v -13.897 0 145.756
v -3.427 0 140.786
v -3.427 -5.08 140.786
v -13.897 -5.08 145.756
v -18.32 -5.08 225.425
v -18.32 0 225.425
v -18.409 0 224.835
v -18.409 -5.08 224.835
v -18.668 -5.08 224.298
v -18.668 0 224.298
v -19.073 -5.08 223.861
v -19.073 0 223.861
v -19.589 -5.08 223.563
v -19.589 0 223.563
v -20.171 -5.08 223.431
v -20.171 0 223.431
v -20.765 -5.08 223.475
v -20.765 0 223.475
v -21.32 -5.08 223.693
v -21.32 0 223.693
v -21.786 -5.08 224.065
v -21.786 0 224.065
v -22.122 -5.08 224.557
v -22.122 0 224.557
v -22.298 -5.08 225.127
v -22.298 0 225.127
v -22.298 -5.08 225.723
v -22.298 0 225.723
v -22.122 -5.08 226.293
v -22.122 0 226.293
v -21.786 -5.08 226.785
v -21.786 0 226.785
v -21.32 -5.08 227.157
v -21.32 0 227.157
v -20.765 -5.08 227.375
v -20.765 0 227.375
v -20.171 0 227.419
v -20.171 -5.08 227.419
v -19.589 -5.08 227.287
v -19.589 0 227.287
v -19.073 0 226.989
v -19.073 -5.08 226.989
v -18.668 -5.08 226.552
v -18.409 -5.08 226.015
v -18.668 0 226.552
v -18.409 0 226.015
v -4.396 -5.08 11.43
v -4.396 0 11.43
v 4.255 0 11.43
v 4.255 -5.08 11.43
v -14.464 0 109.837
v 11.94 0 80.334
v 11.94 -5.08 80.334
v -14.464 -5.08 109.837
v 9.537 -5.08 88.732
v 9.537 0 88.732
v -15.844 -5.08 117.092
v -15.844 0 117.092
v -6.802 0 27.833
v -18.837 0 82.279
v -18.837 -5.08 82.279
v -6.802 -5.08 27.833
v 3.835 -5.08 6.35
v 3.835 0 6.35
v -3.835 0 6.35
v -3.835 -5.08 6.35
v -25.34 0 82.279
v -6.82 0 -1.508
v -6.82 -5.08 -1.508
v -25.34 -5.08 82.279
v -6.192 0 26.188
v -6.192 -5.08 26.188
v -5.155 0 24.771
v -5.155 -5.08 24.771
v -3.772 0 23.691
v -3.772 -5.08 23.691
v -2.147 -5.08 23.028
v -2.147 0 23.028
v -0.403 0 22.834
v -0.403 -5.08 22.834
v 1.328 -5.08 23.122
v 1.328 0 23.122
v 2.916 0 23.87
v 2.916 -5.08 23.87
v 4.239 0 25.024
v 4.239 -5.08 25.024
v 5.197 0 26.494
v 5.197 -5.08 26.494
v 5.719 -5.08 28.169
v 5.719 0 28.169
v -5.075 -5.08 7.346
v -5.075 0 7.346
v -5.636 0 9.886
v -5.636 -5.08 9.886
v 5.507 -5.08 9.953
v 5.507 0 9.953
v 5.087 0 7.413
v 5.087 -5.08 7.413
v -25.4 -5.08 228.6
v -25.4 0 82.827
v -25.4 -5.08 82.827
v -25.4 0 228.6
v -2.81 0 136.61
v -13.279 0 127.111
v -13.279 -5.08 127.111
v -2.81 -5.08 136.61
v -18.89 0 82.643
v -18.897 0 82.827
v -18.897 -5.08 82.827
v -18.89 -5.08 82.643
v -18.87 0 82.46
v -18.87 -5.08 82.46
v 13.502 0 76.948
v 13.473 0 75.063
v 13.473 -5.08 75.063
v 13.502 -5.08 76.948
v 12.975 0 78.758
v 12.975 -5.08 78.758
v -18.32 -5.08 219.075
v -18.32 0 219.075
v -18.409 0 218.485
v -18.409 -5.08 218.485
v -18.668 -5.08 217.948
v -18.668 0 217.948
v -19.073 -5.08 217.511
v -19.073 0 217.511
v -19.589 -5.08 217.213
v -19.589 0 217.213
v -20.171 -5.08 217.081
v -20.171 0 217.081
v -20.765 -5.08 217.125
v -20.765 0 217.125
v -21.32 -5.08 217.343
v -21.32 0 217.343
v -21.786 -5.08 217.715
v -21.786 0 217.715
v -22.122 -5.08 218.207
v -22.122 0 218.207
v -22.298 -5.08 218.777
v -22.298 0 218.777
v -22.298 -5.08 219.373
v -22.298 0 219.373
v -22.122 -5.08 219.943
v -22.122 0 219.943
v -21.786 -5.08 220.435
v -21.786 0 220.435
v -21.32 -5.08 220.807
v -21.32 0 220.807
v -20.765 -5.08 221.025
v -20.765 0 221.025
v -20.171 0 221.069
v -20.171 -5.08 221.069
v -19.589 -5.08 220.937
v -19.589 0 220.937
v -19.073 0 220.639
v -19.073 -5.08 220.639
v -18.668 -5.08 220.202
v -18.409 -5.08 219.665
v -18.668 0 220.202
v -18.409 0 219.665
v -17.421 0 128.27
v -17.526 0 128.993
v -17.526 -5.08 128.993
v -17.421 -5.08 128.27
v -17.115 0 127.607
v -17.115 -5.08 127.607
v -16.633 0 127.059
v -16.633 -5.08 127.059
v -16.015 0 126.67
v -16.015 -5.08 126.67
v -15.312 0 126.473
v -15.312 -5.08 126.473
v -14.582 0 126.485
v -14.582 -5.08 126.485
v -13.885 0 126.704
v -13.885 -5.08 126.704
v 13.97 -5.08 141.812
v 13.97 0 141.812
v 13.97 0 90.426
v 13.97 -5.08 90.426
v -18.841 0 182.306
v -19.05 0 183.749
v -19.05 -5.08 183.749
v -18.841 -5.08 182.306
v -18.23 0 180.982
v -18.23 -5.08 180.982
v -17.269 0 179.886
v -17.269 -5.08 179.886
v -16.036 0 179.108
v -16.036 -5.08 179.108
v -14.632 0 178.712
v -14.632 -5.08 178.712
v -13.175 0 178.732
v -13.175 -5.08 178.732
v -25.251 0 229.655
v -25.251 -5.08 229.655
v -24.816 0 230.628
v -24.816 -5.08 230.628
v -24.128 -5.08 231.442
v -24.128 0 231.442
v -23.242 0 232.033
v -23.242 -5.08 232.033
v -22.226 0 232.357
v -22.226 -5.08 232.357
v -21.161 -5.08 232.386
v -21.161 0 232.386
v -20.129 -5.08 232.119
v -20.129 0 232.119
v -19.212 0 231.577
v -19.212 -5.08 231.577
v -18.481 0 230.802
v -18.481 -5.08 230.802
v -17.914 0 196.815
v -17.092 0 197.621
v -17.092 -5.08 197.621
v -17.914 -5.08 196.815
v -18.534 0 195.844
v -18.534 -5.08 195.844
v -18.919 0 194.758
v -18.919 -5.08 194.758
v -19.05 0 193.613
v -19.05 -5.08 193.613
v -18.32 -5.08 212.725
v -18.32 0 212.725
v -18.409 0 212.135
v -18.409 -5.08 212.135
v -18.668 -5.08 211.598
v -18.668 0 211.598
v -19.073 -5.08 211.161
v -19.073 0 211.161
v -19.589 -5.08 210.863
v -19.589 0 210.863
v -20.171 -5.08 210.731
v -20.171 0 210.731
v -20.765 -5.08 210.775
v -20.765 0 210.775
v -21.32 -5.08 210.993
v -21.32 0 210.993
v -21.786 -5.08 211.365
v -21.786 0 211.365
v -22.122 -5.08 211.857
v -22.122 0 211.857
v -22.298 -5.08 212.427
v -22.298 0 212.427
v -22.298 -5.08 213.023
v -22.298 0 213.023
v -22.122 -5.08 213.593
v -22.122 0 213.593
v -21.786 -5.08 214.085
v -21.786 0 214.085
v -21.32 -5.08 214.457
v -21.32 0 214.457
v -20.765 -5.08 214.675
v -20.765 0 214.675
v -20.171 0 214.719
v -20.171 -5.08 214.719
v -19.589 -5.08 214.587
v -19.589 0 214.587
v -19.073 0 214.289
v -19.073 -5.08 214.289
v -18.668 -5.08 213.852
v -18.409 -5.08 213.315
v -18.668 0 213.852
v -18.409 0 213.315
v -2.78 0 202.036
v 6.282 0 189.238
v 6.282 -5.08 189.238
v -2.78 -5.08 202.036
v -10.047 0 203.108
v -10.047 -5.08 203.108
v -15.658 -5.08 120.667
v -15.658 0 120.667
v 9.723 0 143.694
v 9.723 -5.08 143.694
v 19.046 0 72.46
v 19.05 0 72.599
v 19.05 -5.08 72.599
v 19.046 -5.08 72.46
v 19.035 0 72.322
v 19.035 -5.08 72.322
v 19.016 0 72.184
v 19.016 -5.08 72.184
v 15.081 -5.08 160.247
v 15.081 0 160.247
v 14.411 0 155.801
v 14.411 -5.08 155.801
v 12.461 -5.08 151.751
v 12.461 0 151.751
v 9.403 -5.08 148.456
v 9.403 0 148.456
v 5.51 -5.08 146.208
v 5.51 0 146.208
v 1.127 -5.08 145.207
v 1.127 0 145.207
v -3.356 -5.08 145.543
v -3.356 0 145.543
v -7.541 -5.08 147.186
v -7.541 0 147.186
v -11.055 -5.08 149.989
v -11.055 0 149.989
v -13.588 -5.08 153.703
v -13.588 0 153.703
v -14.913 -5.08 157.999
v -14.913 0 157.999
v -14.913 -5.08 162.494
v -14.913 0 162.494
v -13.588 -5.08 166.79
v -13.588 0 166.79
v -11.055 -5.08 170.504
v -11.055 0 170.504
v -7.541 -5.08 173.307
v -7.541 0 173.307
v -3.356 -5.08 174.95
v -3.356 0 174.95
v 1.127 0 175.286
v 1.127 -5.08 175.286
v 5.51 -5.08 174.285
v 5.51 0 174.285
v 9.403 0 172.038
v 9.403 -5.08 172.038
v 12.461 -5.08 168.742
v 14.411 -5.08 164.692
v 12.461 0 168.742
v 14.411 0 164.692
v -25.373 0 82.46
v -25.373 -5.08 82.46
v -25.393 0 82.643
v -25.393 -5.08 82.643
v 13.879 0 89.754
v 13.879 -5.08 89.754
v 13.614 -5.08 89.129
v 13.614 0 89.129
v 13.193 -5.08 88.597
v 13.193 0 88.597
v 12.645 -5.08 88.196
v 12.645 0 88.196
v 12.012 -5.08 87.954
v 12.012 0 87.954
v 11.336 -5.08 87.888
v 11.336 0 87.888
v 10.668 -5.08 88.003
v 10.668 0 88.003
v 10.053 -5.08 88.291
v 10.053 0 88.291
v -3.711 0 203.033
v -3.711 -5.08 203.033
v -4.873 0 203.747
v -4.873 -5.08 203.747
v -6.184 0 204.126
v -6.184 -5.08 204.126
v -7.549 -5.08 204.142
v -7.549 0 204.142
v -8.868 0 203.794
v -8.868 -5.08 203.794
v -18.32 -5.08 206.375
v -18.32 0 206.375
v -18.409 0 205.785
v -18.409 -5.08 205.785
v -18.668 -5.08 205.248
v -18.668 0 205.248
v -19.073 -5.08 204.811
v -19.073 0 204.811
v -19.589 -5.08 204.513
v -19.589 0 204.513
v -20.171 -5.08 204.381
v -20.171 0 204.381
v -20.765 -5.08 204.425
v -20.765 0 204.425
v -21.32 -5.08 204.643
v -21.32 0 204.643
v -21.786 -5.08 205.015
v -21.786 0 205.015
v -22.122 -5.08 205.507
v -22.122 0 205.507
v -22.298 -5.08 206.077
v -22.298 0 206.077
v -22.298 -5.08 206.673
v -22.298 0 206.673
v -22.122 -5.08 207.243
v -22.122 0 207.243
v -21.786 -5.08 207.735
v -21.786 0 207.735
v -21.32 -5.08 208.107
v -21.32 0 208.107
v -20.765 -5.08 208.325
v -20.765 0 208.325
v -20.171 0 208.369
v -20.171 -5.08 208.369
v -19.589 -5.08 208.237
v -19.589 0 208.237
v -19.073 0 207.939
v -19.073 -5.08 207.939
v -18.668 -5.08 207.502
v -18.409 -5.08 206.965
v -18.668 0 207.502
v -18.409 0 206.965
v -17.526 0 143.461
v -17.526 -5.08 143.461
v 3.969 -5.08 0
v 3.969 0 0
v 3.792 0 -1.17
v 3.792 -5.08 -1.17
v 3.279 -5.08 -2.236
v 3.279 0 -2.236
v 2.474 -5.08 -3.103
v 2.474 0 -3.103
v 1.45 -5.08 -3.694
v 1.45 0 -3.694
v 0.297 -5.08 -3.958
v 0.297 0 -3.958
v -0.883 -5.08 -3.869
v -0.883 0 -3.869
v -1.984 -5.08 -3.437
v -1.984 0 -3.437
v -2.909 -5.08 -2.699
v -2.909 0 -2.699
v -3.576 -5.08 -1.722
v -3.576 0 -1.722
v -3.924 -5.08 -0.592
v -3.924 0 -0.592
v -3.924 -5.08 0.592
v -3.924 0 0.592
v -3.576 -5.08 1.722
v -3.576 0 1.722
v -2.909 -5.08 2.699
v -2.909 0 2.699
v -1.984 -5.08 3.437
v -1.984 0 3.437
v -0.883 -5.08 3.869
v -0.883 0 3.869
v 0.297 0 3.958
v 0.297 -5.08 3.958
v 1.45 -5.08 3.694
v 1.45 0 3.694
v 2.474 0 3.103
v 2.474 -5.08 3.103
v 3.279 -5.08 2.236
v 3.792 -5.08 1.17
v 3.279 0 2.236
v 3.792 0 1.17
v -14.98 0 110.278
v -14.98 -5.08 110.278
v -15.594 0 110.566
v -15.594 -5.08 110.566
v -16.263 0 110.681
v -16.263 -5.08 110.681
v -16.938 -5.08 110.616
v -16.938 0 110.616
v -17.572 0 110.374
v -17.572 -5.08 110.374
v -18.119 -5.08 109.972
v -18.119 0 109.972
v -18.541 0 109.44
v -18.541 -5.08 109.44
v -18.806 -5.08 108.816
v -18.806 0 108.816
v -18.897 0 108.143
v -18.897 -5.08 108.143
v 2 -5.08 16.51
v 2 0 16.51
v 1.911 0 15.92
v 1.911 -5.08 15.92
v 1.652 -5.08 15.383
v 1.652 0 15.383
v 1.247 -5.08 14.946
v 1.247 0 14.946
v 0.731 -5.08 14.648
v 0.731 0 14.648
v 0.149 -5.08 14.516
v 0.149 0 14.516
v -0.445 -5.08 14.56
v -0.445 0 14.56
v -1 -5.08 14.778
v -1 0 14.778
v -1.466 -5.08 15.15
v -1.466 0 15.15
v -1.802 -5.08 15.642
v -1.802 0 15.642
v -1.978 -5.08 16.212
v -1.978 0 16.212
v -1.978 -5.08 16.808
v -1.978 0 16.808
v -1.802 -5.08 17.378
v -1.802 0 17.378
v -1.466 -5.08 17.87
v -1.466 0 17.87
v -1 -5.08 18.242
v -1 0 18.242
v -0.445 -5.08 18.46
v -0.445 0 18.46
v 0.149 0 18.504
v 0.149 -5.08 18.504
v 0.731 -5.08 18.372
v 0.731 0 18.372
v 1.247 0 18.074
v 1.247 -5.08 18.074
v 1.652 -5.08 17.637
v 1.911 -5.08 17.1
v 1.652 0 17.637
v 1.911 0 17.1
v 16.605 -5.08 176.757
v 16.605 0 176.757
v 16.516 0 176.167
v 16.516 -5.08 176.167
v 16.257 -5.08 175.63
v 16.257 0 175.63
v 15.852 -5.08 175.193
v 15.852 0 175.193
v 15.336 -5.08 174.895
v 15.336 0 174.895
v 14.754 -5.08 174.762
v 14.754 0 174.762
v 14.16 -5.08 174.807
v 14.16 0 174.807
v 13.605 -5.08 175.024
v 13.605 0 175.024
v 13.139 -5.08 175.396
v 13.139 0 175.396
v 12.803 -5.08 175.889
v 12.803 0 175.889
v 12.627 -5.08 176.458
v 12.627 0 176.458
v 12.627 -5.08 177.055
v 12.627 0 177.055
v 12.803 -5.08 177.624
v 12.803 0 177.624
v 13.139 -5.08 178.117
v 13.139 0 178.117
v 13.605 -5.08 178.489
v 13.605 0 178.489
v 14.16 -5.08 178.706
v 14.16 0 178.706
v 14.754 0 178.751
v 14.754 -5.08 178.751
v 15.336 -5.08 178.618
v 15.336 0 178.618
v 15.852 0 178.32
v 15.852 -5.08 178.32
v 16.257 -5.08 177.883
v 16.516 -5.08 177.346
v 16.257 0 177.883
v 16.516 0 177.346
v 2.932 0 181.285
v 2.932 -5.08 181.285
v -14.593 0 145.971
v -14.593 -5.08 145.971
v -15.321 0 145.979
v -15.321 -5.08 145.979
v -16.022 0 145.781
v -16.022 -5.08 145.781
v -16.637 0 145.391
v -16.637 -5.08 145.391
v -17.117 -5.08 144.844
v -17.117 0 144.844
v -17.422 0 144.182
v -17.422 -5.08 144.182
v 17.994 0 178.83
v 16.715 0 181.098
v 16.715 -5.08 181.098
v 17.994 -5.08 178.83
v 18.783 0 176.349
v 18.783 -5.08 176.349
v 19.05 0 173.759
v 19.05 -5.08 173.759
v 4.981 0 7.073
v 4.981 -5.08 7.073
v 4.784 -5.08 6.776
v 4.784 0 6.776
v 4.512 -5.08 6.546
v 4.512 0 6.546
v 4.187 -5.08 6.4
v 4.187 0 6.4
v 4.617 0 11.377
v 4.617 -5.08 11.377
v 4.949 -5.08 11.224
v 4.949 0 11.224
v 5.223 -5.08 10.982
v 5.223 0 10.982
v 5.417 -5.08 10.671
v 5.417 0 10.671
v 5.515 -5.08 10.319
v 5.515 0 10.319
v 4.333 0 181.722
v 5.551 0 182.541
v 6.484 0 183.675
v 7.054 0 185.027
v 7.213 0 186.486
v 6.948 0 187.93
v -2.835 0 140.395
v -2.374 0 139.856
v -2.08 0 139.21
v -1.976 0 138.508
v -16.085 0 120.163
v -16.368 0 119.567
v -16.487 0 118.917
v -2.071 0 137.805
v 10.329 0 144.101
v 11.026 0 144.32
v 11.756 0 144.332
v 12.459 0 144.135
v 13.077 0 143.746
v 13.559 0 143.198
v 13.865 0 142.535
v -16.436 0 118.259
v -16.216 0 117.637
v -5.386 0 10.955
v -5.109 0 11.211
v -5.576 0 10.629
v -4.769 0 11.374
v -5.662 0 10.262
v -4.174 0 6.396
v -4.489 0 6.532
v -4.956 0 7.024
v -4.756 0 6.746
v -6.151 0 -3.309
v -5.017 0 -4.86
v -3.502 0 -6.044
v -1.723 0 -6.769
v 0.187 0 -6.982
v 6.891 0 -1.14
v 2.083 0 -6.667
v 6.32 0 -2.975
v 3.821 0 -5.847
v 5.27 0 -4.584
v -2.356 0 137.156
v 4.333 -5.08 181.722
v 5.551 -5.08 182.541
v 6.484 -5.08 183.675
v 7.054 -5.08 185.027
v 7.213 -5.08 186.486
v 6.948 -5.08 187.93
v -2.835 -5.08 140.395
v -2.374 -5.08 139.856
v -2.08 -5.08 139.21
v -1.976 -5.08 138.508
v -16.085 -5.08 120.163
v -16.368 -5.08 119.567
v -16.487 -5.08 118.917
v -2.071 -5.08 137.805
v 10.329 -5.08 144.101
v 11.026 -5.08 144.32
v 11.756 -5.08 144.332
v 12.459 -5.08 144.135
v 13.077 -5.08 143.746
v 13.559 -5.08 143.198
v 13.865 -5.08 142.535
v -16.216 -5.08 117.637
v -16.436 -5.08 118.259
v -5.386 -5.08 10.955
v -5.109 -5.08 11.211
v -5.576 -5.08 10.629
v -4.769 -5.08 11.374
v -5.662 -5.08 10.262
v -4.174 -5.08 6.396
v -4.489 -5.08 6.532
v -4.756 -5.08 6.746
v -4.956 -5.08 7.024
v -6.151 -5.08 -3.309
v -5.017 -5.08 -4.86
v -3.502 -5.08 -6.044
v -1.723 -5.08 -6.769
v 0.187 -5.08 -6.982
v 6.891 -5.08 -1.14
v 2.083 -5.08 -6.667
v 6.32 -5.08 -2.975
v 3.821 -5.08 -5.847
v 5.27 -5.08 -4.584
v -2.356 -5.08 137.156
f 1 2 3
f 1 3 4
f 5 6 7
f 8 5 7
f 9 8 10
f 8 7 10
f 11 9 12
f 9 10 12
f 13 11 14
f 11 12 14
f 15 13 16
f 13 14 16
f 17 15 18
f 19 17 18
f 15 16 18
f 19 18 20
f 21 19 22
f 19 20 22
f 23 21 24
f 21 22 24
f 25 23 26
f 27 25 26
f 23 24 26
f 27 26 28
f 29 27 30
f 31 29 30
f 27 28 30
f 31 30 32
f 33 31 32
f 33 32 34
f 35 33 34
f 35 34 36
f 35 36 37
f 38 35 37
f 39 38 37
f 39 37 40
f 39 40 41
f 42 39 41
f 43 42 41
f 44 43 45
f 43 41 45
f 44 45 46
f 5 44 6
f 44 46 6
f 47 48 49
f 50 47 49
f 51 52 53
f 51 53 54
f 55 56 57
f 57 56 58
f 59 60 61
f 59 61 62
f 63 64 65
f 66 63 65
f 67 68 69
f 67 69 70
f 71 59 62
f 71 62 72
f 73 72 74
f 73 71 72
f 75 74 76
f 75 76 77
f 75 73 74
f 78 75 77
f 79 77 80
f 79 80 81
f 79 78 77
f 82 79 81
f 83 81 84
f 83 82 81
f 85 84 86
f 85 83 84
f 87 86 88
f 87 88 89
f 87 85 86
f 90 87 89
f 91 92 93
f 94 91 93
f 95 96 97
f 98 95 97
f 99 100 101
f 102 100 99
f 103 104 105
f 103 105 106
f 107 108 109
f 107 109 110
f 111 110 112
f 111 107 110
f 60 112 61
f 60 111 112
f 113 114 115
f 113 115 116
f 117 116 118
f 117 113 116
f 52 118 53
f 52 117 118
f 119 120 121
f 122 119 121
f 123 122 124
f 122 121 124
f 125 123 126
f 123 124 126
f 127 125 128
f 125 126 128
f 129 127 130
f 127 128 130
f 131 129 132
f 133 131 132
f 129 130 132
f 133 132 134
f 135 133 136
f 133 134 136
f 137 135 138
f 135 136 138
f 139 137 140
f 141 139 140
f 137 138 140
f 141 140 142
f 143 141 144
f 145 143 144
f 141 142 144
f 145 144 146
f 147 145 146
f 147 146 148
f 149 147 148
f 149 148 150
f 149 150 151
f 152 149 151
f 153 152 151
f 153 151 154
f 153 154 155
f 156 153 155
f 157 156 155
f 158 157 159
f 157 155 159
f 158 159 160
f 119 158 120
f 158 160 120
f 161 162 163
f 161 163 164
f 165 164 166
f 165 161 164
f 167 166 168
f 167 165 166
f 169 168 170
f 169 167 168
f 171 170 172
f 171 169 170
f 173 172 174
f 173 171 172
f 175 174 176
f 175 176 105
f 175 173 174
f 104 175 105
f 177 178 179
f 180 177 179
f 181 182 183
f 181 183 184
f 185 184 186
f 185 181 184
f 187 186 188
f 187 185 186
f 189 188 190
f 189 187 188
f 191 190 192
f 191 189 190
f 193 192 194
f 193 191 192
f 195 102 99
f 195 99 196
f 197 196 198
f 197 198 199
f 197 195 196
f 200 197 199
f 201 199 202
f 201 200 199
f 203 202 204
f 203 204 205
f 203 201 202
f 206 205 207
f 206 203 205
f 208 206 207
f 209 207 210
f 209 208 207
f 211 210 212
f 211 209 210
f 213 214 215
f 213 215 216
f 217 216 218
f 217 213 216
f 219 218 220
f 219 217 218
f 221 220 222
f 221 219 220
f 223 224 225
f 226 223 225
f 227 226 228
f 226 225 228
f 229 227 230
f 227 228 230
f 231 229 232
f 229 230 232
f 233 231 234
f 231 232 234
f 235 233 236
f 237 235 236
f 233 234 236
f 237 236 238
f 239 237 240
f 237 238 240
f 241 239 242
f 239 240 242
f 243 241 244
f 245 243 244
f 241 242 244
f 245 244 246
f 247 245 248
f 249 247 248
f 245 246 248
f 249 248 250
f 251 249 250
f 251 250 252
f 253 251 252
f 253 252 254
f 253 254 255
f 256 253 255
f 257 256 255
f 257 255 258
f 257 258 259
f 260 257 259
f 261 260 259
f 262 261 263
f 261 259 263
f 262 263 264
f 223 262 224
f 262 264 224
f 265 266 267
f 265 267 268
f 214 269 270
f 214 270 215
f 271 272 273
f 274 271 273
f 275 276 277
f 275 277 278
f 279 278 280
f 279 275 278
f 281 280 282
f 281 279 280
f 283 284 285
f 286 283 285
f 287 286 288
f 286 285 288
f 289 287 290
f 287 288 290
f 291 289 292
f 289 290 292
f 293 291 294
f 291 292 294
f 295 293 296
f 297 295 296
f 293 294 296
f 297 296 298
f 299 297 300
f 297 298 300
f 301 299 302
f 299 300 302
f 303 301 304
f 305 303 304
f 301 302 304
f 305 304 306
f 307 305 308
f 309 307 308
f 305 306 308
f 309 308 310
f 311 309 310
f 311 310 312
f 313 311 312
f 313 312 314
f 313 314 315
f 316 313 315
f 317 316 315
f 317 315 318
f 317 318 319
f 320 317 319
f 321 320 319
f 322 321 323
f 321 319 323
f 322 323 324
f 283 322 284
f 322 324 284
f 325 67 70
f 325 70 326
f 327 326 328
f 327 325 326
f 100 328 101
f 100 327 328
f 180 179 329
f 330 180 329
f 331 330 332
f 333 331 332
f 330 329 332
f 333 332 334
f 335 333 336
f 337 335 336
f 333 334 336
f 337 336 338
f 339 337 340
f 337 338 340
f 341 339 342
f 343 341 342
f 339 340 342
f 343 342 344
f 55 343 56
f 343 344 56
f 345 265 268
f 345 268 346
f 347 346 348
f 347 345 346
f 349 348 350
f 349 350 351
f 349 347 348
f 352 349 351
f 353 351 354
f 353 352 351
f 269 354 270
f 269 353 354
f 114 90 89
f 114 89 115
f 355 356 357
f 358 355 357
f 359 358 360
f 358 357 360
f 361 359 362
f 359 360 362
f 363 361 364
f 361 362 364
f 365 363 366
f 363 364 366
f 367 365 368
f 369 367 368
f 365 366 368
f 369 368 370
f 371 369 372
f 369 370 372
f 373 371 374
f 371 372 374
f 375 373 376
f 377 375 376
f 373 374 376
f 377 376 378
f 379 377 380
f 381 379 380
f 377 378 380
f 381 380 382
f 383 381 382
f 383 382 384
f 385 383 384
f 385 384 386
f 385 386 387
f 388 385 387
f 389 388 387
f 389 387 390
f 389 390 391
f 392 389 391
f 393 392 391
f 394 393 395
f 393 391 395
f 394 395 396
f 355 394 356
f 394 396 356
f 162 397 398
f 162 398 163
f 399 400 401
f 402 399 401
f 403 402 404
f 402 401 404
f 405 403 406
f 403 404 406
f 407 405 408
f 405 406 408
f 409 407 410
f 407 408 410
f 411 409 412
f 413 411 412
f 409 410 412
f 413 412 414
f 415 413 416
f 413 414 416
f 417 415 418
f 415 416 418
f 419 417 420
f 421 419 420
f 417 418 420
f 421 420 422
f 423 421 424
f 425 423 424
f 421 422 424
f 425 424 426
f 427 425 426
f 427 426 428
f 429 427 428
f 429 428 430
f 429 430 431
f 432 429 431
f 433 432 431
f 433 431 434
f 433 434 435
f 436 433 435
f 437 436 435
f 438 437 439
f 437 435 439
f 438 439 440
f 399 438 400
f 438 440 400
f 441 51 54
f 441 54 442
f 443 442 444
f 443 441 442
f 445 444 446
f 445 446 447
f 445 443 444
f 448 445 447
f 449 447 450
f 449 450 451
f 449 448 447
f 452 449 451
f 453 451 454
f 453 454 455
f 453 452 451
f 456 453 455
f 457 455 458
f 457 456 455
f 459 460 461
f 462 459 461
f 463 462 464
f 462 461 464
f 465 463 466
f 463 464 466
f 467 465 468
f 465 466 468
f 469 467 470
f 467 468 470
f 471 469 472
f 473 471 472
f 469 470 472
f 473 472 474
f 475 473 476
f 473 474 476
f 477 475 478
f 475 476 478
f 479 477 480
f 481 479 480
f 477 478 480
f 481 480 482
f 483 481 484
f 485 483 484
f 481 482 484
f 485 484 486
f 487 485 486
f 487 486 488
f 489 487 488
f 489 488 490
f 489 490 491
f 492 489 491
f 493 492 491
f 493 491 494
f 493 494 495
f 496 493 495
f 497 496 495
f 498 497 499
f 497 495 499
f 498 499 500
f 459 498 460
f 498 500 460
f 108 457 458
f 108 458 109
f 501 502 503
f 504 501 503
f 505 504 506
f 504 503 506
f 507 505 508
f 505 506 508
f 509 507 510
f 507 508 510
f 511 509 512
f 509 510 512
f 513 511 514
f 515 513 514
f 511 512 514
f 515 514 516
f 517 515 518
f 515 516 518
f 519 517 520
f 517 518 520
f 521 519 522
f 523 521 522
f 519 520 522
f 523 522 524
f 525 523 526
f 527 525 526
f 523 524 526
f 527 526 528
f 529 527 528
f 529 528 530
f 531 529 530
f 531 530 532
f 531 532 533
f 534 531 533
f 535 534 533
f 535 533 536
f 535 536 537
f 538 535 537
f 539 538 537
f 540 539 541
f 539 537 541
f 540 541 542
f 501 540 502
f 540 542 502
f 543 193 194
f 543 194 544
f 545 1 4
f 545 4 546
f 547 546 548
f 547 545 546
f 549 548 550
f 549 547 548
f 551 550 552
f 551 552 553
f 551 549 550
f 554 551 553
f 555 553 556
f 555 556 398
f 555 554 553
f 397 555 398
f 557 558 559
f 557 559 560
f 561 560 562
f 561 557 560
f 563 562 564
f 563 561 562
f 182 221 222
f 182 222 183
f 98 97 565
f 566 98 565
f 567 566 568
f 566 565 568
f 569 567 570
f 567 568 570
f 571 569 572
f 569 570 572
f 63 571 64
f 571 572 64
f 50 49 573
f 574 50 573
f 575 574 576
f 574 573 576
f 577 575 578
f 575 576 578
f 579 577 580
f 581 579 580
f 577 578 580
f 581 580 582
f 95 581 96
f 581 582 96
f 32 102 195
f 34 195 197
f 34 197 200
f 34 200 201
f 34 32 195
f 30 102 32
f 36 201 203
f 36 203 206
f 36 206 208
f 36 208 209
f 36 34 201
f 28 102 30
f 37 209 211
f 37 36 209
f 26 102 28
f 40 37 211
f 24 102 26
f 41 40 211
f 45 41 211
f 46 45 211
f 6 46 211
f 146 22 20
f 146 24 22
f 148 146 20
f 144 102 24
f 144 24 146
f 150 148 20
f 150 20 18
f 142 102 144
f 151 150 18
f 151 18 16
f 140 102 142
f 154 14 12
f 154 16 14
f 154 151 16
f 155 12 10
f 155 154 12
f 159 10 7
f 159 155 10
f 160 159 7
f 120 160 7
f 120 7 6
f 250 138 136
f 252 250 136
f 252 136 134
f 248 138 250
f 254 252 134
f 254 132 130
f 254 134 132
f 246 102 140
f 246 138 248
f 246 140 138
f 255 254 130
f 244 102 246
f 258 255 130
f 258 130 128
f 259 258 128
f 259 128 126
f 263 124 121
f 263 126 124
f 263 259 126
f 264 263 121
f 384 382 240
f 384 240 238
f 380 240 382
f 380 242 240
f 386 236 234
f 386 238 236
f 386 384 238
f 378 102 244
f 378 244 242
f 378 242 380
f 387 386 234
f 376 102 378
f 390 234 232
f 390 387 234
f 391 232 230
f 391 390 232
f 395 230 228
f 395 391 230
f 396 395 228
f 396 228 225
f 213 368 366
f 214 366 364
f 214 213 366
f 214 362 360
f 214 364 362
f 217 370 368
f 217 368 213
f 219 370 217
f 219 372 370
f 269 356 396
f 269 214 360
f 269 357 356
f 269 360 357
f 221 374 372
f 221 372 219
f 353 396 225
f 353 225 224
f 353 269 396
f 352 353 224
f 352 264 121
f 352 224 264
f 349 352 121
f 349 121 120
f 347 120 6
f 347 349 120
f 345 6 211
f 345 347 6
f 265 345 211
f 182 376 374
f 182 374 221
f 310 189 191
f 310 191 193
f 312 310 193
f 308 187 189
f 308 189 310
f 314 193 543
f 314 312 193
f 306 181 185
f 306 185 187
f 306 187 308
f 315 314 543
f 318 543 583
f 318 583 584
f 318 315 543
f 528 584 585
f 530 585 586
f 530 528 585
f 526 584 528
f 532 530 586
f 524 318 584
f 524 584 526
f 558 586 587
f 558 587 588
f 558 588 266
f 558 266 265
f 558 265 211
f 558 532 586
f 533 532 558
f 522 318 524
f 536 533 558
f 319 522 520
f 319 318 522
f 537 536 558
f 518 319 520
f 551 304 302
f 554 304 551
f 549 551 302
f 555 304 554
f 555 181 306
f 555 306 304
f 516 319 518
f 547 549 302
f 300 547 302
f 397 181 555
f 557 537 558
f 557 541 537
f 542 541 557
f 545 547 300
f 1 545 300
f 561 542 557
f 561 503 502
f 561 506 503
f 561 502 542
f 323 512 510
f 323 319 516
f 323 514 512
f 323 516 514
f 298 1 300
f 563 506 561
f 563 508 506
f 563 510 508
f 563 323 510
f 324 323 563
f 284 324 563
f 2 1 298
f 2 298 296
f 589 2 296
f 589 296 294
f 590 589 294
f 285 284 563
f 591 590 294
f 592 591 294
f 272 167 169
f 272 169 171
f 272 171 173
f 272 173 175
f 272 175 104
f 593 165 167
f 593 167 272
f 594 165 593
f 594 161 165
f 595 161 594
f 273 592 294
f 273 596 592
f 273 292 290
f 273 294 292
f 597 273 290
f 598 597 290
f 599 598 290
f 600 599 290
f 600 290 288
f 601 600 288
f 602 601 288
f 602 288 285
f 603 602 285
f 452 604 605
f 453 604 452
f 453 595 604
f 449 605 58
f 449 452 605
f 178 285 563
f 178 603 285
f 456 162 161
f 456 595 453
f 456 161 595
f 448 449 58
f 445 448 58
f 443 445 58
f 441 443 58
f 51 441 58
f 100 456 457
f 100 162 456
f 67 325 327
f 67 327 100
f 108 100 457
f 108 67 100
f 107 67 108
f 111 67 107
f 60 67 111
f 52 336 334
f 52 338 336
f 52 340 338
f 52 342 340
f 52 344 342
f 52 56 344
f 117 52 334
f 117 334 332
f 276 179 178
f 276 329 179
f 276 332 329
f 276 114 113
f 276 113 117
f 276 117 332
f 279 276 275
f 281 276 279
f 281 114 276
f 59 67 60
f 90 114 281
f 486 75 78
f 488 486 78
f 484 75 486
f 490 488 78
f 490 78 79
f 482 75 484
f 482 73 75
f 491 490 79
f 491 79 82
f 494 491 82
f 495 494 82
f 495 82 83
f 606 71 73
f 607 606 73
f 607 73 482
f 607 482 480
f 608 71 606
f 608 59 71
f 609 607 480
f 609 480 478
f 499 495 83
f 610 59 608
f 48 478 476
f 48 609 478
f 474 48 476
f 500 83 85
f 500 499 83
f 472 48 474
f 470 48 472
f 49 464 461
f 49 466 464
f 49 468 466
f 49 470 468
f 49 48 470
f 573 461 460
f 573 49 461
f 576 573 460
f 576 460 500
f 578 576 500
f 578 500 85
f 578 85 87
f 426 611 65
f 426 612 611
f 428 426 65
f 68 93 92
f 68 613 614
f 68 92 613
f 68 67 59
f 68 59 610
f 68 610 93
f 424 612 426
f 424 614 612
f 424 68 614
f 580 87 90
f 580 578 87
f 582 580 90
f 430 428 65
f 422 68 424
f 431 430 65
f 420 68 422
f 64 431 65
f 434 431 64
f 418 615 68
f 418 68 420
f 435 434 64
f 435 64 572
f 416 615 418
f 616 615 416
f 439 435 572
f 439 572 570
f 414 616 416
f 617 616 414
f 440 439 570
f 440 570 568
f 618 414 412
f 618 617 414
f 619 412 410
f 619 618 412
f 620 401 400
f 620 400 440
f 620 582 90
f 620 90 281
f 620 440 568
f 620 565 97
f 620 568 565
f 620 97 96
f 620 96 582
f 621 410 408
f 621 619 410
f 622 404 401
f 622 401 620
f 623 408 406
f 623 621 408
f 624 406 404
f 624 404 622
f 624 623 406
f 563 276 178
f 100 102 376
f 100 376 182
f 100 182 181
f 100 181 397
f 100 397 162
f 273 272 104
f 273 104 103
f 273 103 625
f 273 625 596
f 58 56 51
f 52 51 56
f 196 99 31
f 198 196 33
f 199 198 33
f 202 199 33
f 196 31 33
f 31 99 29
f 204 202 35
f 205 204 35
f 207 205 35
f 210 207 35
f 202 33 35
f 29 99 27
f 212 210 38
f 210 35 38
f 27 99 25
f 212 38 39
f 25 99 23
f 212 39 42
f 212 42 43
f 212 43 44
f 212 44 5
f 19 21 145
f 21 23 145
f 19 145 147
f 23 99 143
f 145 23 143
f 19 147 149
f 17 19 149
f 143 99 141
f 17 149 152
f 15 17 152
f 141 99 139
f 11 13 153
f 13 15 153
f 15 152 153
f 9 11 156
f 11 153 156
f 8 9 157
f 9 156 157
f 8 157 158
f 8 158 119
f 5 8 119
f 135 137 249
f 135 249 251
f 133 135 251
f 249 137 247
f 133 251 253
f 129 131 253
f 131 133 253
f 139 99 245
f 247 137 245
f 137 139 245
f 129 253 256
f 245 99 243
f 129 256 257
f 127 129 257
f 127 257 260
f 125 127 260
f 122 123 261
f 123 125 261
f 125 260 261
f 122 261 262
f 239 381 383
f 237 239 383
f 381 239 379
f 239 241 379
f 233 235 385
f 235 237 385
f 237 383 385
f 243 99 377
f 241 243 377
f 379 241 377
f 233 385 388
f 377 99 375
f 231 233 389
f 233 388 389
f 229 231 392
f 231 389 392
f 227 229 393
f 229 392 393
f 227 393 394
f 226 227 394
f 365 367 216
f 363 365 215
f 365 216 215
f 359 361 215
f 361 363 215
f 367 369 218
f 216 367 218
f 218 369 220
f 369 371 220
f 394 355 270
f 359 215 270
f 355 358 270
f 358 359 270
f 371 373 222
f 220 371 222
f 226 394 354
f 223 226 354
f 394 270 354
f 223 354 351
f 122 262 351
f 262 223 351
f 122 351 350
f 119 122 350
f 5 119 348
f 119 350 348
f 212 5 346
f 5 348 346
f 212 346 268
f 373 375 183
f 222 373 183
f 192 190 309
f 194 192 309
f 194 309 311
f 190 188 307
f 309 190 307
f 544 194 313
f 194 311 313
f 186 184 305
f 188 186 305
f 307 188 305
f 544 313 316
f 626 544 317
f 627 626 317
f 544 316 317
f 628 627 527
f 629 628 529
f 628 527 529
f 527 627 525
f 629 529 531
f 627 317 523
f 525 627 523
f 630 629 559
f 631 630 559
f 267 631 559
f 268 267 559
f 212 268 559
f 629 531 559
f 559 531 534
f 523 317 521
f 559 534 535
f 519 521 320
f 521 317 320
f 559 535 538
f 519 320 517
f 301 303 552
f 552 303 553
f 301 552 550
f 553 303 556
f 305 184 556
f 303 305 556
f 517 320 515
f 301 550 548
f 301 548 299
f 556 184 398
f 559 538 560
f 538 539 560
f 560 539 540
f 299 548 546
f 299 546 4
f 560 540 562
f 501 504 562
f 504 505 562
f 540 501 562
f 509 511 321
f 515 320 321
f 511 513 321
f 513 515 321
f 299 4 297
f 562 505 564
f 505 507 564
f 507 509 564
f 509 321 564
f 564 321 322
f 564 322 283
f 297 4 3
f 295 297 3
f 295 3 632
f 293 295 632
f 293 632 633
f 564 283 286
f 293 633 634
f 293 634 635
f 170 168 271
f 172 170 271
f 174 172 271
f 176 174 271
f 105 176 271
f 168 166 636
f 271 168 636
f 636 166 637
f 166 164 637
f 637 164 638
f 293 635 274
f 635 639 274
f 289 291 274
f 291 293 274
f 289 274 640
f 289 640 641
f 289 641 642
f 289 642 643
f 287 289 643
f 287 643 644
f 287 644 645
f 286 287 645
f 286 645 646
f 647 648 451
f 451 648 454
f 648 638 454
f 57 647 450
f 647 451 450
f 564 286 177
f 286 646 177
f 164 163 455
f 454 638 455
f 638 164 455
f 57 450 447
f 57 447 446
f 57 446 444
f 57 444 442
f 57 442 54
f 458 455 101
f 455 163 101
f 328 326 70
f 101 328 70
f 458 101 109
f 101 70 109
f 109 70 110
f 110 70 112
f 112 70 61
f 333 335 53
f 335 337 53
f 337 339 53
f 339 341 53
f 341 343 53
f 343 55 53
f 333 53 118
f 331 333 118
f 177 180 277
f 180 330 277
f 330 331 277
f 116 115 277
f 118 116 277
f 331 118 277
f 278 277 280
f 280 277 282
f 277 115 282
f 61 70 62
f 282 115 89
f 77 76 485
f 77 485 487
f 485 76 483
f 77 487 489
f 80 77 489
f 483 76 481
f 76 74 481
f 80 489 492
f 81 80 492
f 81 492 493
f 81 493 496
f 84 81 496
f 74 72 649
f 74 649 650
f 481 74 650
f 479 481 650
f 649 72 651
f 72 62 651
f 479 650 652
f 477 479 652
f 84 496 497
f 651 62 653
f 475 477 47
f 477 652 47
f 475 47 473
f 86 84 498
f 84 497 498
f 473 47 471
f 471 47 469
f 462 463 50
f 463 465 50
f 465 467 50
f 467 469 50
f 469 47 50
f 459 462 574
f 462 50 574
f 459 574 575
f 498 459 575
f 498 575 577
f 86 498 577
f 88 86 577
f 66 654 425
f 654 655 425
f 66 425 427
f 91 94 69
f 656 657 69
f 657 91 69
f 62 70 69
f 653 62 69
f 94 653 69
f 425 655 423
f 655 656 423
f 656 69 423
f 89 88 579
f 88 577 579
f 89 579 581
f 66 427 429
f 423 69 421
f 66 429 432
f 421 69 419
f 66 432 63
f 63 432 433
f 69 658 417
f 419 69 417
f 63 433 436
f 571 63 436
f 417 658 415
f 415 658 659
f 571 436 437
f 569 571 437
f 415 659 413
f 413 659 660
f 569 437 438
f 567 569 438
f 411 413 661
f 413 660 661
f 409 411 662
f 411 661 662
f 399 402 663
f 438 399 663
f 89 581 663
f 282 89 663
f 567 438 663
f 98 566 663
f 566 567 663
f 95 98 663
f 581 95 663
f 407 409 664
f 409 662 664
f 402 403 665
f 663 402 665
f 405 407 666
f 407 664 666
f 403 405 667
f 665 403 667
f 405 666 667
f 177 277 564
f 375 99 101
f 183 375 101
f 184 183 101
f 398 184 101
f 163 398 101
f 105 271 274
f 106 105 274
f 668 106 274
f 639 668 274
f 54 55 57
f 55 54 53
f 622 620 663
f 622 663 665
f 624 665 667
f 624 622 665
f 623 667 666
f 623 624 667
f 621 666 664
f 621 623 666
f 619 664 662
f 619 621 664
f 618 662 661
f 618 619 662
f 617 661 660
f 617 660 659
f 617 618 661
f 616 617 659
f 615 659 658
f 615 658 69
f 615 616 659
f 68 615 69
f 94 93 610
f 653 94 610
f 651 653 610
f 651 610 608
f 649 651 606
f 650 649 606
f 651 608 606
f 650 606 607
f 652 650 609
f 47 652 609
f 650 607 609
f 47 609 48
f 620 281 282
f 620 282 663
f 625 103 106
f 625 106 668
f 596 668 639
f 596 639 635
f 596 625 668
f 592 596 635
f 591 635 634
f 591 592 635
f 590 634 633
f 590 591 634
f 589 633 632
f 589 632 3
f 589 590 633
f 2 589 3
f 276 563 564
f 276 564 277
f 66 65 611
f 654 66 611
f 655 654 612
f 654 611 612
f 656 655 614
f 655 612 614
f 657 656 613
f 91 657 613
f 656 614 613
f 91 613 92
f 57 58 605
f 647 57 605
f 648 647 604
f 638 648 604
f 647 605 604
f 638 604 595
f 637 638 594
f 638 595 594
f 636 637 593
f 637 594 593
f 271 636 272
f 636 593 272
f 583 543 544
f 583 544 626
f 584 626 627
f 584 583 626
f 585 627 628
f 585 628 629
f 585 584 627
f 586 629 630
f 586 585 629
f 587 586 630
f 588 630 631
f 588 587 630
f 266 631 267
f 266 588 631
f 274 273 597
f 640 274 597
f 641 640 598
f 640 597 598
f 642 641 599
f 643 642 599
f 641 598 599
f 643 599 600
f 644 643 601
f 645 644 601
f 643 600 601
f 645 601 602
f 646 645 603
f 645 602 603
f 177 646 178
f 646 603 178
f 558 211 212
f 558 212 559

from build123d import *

# Parameters (mm, degrees)
SKETCH11_R          = 3.96875
SKETCH11_R_2        = 15.08125
SKETCH11_R_3        = 2
BOSS_EXTRUDE2_DEPTH = 5.08


with BuildPart() as part:
    # Sketch11 → Boss-Extrude2 (new body)
    with BuildSketch(Plane(origin=(0, 0, 0), x_dir=(1, 0, 0), z_dir=(0, 1, 0))):
        with BuildLine():
            Line((19.05, -173.758834345), (19.05, -72.598586407))
            ThreePointArc((19.05, -72.598586407), (19.041478453, -72.390699795), (19.015970989, -72.184208077))
            Line((19.015970989, -72.184208077), (6.891420221, 1.139540409))
            ThreePointArc((6.891420221, 1.139540409), (0.187396777, 6.982485764), (-6.820377584, 1.507539257))
            Line((-6.820377584, 1.507539257), (-25.340137303, -82.279170439))
            ThreePointArc((-25.340137303, -82.279170439), (-25.384989975, -82.551639086), (-25.4, -82.827366533))
            Line((-25.4, -82.827366533), (-25.4, -177.8))
            Line((-25.4, -177.8), (-25.4, -228.6))
            ThreePointArc((-25.4, -228.6), (-22.745272537, -232.230626029), (-18.480606107, -230.801765114))
            Line((-18.480606107, -230.801765114), (16.71464631, -181.098051393))
            ThreePointArc((16.71464631, -181.098051393), (18.452086765, -177.609742801), (19.05, -173.758834345))
        make_face()
        Circle(SKETCH11_R, mode=Mode.SUBTRACT)
        with Locations((0, -160.246508934)):
            Circle(SKETCH11_R_2, mode=Mode.SUBTRACT)
        with Locations((-20.32, -225.425)):
            Circle(SKETCH11_R_3, mode=Mode.SUBTRACT)
        with Locations((-20.32, -219.075)):
            Circle(SKETCH11_R_3, mode=Mode.SUBTRACT)
        with Locations((-20.32, -212.725)):
            Circle(SKETCH11_R_3, mode=Mode.SUBTRACT)
        with Locations((-20.32, -206.375)):
            Circle(SKETCH11_R_3, mode=Mode.SUBTRACT)
        with Locations((0, -16.51)):
            Circle(SKETCH11_R_3, mode=Mode.SUBTRACT)
        with Locations((14.605, -176.756508934)):
            Circle(SKETCH11_R_3, mode=Mode.SUBTRACT)
        with BuildLine():
            Line((11.940278596, -80.334093652), (-14.464036902, -109.837128051))
            ThreePointArc((-14.464036902, -109.837128051), (-17.263416449, -110.515885849), (-18.896731016, -108.143224574))
            Line((-18.896731016, -108.143224574), (-18.896731016, -82.827366533))
            ThreePointArc((-18.896731016, -82.827366533), (-18.881720992, -82.551639086), (-18.83686832, -82.279170439))
            Line((-18.83686832, -82.279170439), (-6.80244992, -27.833306339))
            ThreePointArc((-6.80244992, -27.833306339), (-0.402909414, -22.833553189), (5.719243979, -28.169365038))
            Line((5.719243979, -28.169365038), (13.473470783, -75.063389134))
            ThreePointArc((13.473470783, -75.063389134), (13.305815609, -77.87296697), (11.940278596, -80.334093652))
        make_face(mode=Mode.SUBTRACT)
        with BuildLine():
            Line((13.97, -141.812492878), (13.97, -90.426050798))
            ThreePointArc((13.97, -90.426050798), (12.336685433, -88.053389523), (9.537305885, -88.732147321))
            Line((9.537305885, -88.732147321), (-15.843545445, -117.091607347))
            ThreePointArc((-15.843545445, -117.091607347), (-16.487420873, -118.917476564), (-15.657551613, -120.666673802))
            Line((-15.657551613, -120.666673802), (9.723299718, -143.693655856))
            ThreePointArc((9.723299718, -143.693655856), (12.458732541, -144.134842843), (13.97, -141.812492878))
        make_face(mode=Mode.SUBTRACT)
        with BuildLine():
            Line((-13.279299718, -127.111337727), (-2.809524218, -136.610125984))
            ThreePointArc((-2.809524218, -136.610125984), (-2.003545388, -138.86283126), (-3.426980373, -140.785879825))
            Line((-3.426980373, -140.785879825), (-13.896755873, -145.755890669))
            ThreePointArc((-13.896755873, -145.755890669), (-16.343372447, -145.60819059), (-17.526, -143.461299805))
            Line((-17.526, -143.461299805), (-17.526, -128.992500705))
            ThreePointArc((-17.526, -128.992500705), (-16.014732541, -126.67015074), (-13.279299718, -127.111337727))
        make_face(mode=Mode.SUBTRACT)
        with BuildLine():
            Line((6.282161105, -189.238159376), (-2.779804772, -202.035719466))
            ThreePointArc((-2.779804772, -202.035719466), (-6.184281083, -204.125642303), (-10.047215475, -203.107814076))
            Line((-10.047215475, -203.107814076), (-17.09155218, -197.621171408))
            ThreePointArc((-17.09155218, -197.621171408), (-18.534202289, -195.843739158), (-19.05, -193.613389978))
            Line((-19.05, -193.613389978), (-19.05, -183.748869713))
            ThreePointArc((-19.05, -183.748869713), (-17.268890157, -179.885746141), (-13.174518217, -178.731538875))
            Line((-13.174518217, -178.731538875), (2.931784364, -181.28514172))
            ThreePointArc((2.931784364, -181.28514172), (6.817844364, -184.330274157), (6.282161105, -189.238159376))
        make_face(mode=Mode.SUBTRACT)
        with BuildLine():
            Line((3.834506832, -6.35), (-3.834506832, -6.35))
            ThreePointArc((-3.834506832, -6.35), (-4.629741225, -6.629796859), (-5.074575483, -7.345901953))
            Line((-5.074575483, -7.345901953), (-5.636003302, -9.885901953))
            ThreePointArc((-5.636003302, -9.885901953), (-5.386137791, -10.955234393), (-4.395934651, -11.43))
            Line((-4.395934651, -11.43), (4.254512077, -11.43))
            ThreePointArc((4.254512077, -11.43), (5.223023884, -10.981513774), (5.507497571, -9.952810835))
            Line((5.507497571, -9.952810835), (5.087492326, -7.412810835))
            ThreePointArc((5.087492326, -7.412810835), (4.656020605, -6.651488193), (3.834506832, -6.35))
        make_face(mode=Mode.SUBTRACT)
    extrude(amount=-BOSS_EXTRUDE2_DEPTH)


solid = part.part
